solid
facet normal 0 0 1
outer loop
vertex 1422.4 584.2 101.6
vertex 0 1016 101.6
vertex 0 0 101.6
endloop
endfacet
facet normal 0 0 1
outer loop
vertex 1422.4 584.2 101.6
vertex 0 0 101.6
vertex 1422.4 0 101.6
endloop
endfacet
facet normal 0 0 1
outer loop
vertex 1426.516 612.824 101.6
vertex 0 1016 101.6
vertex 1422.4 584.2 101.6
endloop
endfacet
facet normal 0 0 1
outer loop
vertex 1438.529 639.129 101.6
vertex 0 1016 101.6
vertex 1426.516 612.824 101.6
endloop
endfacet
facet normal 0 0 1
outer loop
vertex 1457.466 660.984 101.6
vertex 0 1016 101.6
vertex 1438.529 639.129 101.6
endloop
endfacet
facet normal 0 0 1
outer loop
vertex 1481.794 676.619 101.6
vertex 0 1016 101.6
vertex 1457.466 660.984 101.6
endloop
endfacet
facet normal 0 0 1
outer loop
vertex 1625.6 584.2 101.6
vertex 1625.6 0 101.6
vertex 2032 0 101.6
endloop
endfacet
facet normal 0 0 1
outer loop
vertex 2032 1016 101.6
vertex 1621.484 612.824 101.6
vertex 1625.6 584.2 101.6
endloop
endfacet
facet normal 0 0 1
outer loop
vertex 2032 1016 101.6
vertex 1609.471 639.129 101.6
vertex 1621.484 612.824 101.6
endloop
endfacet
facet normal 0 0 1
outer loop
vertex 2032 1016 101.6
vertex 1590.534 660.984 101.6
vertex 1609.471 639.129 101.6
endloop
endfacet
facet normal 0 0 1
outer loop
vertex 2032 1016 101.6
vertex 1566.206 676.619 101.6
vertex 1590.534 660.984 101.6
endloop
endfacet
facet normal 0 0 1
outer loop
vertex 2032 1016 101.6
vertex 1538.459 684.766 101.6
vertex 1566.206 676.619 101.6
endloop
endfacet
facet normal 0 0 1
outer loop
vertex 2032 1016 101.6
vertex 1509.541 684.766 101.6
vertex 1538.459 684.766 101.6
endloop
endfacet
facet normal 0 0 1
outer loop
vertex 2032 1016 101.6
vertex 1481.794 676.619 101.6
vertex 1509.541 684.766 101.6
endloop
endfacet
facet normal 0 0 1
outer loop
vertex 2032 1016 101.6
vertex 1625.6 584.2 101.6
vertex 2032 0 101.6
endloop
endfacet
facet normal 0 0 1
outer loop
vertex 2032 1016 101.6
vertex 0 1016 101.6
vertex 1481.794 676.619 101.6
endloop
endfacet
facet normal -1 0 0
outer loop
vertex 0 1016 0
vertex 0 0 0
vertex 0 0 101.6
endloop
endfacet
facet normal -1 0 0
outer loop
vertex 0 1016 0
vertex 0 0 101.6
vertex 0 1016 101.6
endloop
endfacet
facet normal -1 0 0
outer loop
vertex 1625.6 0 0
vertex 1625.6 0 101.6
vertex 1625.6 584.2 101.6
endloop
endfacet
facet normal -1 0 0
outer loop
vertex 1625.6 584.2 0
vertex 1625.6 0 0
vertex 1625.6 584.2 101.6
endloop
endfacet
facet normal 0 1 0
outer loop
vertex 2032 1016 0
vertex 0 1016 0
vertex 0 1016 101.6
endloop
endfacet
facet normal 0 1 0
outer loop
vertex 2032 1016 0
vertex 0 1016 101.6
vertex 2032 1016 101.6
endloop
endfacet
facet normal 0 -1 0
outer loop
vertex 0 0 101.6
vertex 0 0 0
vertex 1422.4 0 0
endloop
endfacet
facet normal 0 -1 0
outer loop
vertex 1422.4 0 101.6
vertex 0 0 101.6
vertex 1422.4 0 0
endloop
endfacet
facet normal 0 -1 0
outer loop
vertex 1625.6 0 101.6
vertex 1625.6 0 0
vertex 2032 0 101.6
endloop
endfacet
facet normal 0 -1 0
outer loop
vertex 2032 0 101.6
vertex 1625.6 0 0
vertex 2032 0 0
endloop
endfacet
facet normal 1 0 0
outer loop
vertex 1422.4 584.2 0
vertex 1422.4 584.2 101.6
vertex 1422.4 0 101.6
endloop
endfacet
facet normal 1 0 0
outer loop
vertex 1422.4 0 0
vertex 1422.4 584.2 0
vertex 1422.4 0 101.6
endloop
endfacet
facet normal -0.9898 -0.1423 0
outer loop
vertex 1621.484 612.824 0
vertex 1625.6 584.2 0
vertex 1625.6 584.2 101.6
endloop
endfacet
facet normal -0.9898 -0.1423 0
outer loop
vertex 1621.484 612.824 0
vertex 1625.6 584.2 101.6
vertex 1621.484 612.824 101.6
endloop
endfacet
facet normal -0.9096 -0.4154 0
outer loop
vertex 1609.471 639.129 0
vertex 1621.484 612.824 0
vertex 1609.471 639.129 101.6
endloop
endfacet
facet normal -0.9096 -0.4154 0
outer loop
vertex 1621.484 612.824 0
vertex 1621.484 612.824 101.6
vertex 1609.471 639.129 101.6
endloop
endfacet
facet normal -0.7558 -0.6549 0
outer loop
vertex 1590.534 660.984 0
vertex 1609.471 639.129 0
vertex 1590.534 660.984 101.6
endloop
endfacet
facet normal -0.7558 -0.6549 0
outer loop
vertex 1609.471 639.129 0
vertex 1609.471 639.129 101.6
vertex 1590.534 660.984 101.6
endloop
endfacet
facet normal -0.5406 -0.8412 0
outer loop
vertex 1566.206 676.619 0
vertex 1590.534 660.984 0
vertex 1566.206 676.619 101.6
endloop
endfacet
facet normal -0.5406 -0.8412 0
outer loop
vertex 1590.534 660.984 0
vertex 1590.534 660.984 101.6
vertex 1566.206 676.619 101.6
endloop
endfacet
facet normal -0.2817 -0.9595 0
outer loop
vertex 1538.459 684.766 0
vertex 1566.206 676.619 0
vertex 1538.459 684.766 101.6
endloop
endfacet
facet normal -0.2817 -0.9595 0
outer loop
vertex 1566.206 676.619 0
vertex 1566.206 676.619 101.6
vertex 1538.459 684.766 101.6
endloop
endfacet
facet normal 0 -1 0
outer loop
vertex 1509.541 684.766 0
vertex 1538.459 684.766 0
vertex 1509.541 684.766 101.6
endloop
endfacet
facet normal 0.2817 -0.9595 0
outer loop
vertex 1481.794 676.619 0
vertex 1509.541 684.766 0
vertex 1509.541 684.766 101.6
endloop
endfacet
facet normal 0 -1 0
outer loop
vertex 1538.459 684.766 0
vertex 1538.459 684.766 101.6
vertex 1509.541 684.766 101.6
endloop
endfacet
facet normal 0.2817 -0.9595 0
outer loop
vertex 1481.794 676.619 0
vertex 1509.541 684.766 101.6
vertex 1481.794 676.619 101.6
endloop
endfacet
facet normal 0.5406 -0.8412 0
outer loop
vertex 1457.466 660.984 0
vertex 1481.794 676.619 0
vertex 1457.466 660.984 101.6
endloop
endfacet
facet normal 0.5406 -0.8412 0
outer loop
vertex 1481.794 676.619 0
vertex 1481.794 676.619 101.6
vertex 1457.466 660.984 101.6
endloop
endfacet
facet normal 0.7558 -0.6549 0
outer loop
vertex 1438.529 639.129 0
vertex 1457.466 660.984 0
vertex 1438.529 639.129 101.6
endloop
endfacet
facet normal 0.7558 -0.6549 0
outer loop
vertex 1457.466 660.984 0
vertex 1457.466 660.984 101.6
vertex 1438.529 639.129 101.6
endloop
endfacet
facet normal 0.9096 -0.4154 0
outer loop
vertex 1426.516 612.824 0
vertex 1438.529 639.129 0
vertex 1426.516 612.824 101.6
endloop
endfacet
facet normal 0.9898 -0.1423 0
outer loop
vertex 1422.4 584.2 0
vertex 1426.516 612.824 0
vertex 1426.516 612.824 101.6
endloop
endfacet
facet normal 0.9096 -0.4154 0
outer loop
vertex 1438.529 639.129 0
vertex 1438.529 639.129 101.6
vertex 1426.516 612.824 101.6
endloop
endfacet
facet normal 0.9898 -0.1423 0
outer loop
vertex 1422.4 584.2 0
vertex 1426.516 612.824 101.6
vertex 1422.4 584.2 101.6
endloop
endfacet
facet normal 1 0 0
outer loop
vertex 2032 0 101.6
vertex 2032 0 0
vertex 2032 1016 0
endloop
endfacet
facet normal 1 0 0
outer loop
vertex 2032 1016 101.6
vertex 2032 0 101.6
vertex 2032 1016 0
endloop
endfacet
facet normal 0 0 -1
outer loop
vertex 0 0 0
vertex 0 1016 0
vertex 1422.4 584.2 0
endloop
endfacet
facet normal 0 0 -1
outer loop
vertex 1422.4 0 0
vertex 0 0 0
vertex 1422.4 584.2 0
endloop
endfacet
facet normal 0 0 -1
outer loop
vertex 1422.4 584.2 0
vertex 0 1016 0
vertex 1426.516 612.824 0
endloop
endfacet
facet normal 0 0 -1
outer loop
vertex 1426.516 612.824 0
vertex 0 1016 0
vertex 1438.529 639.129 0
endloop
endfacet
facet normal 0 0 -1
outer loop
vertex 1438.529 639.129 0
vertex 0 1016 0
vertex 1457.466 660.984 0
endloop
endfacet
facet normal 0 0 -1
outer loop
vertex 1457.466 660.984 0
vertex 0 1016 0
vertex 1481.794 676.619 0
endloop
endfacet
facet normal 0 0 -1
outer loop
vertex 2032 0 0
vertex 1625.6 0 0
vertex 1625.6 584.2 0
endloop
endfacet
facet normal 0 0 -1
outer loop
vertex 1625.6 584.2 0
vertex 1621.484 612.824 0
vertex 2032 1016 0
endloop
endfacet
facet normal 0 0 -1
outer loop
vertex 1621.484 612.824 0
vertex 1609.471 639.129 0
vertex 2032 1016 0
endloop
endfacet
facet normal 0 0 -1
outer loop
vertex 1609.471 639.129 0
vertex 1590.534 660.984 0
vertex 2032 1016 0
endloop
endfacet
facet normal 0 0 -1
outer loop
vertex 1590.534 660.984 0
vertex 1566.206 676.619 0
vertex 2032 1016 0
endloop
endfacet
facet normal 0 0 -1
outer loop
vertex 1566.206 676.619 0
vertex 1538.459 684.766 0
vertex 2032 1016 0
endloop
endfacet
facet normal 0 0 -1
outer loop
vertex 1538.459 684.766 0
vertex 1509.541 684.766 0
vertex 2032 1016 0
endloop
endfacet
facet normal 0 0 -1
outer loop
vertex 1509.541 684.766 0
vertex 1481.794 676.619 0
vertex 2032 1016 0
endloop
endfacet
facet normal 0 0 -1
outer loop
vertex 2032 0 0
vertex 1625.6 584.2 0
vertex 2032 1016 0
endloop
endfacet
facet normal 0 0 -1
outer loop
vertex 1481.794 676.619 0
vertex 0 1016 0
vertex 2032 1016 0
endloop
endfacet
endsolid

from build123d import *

# Parameters (mm, degrees)
F0_W     = 2032
F0_H     = 1016
F1_DEPTH = 101.6
F3_DEPTH = 101.601


with BuildPart() as f1:
    # F0 (on Top) → F1 (new body)
    with BuildSketch(Plane.XY):
        with Locations((1016, 508)):
            Rectangle(F0_W, F0_H)
    extrude(amount=F1_DEPTH)

    # F2 (on face) → F3 (cut, through all)
    with BuildSketch(Plane.XY.offset(101.6)):
        with BuildLine():
            Line((1422.4, 584.2), (1422.4, 0))
            Line((1422.4, 0), (1625.6, 0))
            Line((1625.6, 0), (1625.6, 584.2))
            ThreePointArc((1625.6, 584.2), (1524, 685.8), (1422.4, 584.2))
        make_face()
    extrude(amount=-F3_DEPTH, mode=Mode.SUBTRACT)


solid = f1.part
